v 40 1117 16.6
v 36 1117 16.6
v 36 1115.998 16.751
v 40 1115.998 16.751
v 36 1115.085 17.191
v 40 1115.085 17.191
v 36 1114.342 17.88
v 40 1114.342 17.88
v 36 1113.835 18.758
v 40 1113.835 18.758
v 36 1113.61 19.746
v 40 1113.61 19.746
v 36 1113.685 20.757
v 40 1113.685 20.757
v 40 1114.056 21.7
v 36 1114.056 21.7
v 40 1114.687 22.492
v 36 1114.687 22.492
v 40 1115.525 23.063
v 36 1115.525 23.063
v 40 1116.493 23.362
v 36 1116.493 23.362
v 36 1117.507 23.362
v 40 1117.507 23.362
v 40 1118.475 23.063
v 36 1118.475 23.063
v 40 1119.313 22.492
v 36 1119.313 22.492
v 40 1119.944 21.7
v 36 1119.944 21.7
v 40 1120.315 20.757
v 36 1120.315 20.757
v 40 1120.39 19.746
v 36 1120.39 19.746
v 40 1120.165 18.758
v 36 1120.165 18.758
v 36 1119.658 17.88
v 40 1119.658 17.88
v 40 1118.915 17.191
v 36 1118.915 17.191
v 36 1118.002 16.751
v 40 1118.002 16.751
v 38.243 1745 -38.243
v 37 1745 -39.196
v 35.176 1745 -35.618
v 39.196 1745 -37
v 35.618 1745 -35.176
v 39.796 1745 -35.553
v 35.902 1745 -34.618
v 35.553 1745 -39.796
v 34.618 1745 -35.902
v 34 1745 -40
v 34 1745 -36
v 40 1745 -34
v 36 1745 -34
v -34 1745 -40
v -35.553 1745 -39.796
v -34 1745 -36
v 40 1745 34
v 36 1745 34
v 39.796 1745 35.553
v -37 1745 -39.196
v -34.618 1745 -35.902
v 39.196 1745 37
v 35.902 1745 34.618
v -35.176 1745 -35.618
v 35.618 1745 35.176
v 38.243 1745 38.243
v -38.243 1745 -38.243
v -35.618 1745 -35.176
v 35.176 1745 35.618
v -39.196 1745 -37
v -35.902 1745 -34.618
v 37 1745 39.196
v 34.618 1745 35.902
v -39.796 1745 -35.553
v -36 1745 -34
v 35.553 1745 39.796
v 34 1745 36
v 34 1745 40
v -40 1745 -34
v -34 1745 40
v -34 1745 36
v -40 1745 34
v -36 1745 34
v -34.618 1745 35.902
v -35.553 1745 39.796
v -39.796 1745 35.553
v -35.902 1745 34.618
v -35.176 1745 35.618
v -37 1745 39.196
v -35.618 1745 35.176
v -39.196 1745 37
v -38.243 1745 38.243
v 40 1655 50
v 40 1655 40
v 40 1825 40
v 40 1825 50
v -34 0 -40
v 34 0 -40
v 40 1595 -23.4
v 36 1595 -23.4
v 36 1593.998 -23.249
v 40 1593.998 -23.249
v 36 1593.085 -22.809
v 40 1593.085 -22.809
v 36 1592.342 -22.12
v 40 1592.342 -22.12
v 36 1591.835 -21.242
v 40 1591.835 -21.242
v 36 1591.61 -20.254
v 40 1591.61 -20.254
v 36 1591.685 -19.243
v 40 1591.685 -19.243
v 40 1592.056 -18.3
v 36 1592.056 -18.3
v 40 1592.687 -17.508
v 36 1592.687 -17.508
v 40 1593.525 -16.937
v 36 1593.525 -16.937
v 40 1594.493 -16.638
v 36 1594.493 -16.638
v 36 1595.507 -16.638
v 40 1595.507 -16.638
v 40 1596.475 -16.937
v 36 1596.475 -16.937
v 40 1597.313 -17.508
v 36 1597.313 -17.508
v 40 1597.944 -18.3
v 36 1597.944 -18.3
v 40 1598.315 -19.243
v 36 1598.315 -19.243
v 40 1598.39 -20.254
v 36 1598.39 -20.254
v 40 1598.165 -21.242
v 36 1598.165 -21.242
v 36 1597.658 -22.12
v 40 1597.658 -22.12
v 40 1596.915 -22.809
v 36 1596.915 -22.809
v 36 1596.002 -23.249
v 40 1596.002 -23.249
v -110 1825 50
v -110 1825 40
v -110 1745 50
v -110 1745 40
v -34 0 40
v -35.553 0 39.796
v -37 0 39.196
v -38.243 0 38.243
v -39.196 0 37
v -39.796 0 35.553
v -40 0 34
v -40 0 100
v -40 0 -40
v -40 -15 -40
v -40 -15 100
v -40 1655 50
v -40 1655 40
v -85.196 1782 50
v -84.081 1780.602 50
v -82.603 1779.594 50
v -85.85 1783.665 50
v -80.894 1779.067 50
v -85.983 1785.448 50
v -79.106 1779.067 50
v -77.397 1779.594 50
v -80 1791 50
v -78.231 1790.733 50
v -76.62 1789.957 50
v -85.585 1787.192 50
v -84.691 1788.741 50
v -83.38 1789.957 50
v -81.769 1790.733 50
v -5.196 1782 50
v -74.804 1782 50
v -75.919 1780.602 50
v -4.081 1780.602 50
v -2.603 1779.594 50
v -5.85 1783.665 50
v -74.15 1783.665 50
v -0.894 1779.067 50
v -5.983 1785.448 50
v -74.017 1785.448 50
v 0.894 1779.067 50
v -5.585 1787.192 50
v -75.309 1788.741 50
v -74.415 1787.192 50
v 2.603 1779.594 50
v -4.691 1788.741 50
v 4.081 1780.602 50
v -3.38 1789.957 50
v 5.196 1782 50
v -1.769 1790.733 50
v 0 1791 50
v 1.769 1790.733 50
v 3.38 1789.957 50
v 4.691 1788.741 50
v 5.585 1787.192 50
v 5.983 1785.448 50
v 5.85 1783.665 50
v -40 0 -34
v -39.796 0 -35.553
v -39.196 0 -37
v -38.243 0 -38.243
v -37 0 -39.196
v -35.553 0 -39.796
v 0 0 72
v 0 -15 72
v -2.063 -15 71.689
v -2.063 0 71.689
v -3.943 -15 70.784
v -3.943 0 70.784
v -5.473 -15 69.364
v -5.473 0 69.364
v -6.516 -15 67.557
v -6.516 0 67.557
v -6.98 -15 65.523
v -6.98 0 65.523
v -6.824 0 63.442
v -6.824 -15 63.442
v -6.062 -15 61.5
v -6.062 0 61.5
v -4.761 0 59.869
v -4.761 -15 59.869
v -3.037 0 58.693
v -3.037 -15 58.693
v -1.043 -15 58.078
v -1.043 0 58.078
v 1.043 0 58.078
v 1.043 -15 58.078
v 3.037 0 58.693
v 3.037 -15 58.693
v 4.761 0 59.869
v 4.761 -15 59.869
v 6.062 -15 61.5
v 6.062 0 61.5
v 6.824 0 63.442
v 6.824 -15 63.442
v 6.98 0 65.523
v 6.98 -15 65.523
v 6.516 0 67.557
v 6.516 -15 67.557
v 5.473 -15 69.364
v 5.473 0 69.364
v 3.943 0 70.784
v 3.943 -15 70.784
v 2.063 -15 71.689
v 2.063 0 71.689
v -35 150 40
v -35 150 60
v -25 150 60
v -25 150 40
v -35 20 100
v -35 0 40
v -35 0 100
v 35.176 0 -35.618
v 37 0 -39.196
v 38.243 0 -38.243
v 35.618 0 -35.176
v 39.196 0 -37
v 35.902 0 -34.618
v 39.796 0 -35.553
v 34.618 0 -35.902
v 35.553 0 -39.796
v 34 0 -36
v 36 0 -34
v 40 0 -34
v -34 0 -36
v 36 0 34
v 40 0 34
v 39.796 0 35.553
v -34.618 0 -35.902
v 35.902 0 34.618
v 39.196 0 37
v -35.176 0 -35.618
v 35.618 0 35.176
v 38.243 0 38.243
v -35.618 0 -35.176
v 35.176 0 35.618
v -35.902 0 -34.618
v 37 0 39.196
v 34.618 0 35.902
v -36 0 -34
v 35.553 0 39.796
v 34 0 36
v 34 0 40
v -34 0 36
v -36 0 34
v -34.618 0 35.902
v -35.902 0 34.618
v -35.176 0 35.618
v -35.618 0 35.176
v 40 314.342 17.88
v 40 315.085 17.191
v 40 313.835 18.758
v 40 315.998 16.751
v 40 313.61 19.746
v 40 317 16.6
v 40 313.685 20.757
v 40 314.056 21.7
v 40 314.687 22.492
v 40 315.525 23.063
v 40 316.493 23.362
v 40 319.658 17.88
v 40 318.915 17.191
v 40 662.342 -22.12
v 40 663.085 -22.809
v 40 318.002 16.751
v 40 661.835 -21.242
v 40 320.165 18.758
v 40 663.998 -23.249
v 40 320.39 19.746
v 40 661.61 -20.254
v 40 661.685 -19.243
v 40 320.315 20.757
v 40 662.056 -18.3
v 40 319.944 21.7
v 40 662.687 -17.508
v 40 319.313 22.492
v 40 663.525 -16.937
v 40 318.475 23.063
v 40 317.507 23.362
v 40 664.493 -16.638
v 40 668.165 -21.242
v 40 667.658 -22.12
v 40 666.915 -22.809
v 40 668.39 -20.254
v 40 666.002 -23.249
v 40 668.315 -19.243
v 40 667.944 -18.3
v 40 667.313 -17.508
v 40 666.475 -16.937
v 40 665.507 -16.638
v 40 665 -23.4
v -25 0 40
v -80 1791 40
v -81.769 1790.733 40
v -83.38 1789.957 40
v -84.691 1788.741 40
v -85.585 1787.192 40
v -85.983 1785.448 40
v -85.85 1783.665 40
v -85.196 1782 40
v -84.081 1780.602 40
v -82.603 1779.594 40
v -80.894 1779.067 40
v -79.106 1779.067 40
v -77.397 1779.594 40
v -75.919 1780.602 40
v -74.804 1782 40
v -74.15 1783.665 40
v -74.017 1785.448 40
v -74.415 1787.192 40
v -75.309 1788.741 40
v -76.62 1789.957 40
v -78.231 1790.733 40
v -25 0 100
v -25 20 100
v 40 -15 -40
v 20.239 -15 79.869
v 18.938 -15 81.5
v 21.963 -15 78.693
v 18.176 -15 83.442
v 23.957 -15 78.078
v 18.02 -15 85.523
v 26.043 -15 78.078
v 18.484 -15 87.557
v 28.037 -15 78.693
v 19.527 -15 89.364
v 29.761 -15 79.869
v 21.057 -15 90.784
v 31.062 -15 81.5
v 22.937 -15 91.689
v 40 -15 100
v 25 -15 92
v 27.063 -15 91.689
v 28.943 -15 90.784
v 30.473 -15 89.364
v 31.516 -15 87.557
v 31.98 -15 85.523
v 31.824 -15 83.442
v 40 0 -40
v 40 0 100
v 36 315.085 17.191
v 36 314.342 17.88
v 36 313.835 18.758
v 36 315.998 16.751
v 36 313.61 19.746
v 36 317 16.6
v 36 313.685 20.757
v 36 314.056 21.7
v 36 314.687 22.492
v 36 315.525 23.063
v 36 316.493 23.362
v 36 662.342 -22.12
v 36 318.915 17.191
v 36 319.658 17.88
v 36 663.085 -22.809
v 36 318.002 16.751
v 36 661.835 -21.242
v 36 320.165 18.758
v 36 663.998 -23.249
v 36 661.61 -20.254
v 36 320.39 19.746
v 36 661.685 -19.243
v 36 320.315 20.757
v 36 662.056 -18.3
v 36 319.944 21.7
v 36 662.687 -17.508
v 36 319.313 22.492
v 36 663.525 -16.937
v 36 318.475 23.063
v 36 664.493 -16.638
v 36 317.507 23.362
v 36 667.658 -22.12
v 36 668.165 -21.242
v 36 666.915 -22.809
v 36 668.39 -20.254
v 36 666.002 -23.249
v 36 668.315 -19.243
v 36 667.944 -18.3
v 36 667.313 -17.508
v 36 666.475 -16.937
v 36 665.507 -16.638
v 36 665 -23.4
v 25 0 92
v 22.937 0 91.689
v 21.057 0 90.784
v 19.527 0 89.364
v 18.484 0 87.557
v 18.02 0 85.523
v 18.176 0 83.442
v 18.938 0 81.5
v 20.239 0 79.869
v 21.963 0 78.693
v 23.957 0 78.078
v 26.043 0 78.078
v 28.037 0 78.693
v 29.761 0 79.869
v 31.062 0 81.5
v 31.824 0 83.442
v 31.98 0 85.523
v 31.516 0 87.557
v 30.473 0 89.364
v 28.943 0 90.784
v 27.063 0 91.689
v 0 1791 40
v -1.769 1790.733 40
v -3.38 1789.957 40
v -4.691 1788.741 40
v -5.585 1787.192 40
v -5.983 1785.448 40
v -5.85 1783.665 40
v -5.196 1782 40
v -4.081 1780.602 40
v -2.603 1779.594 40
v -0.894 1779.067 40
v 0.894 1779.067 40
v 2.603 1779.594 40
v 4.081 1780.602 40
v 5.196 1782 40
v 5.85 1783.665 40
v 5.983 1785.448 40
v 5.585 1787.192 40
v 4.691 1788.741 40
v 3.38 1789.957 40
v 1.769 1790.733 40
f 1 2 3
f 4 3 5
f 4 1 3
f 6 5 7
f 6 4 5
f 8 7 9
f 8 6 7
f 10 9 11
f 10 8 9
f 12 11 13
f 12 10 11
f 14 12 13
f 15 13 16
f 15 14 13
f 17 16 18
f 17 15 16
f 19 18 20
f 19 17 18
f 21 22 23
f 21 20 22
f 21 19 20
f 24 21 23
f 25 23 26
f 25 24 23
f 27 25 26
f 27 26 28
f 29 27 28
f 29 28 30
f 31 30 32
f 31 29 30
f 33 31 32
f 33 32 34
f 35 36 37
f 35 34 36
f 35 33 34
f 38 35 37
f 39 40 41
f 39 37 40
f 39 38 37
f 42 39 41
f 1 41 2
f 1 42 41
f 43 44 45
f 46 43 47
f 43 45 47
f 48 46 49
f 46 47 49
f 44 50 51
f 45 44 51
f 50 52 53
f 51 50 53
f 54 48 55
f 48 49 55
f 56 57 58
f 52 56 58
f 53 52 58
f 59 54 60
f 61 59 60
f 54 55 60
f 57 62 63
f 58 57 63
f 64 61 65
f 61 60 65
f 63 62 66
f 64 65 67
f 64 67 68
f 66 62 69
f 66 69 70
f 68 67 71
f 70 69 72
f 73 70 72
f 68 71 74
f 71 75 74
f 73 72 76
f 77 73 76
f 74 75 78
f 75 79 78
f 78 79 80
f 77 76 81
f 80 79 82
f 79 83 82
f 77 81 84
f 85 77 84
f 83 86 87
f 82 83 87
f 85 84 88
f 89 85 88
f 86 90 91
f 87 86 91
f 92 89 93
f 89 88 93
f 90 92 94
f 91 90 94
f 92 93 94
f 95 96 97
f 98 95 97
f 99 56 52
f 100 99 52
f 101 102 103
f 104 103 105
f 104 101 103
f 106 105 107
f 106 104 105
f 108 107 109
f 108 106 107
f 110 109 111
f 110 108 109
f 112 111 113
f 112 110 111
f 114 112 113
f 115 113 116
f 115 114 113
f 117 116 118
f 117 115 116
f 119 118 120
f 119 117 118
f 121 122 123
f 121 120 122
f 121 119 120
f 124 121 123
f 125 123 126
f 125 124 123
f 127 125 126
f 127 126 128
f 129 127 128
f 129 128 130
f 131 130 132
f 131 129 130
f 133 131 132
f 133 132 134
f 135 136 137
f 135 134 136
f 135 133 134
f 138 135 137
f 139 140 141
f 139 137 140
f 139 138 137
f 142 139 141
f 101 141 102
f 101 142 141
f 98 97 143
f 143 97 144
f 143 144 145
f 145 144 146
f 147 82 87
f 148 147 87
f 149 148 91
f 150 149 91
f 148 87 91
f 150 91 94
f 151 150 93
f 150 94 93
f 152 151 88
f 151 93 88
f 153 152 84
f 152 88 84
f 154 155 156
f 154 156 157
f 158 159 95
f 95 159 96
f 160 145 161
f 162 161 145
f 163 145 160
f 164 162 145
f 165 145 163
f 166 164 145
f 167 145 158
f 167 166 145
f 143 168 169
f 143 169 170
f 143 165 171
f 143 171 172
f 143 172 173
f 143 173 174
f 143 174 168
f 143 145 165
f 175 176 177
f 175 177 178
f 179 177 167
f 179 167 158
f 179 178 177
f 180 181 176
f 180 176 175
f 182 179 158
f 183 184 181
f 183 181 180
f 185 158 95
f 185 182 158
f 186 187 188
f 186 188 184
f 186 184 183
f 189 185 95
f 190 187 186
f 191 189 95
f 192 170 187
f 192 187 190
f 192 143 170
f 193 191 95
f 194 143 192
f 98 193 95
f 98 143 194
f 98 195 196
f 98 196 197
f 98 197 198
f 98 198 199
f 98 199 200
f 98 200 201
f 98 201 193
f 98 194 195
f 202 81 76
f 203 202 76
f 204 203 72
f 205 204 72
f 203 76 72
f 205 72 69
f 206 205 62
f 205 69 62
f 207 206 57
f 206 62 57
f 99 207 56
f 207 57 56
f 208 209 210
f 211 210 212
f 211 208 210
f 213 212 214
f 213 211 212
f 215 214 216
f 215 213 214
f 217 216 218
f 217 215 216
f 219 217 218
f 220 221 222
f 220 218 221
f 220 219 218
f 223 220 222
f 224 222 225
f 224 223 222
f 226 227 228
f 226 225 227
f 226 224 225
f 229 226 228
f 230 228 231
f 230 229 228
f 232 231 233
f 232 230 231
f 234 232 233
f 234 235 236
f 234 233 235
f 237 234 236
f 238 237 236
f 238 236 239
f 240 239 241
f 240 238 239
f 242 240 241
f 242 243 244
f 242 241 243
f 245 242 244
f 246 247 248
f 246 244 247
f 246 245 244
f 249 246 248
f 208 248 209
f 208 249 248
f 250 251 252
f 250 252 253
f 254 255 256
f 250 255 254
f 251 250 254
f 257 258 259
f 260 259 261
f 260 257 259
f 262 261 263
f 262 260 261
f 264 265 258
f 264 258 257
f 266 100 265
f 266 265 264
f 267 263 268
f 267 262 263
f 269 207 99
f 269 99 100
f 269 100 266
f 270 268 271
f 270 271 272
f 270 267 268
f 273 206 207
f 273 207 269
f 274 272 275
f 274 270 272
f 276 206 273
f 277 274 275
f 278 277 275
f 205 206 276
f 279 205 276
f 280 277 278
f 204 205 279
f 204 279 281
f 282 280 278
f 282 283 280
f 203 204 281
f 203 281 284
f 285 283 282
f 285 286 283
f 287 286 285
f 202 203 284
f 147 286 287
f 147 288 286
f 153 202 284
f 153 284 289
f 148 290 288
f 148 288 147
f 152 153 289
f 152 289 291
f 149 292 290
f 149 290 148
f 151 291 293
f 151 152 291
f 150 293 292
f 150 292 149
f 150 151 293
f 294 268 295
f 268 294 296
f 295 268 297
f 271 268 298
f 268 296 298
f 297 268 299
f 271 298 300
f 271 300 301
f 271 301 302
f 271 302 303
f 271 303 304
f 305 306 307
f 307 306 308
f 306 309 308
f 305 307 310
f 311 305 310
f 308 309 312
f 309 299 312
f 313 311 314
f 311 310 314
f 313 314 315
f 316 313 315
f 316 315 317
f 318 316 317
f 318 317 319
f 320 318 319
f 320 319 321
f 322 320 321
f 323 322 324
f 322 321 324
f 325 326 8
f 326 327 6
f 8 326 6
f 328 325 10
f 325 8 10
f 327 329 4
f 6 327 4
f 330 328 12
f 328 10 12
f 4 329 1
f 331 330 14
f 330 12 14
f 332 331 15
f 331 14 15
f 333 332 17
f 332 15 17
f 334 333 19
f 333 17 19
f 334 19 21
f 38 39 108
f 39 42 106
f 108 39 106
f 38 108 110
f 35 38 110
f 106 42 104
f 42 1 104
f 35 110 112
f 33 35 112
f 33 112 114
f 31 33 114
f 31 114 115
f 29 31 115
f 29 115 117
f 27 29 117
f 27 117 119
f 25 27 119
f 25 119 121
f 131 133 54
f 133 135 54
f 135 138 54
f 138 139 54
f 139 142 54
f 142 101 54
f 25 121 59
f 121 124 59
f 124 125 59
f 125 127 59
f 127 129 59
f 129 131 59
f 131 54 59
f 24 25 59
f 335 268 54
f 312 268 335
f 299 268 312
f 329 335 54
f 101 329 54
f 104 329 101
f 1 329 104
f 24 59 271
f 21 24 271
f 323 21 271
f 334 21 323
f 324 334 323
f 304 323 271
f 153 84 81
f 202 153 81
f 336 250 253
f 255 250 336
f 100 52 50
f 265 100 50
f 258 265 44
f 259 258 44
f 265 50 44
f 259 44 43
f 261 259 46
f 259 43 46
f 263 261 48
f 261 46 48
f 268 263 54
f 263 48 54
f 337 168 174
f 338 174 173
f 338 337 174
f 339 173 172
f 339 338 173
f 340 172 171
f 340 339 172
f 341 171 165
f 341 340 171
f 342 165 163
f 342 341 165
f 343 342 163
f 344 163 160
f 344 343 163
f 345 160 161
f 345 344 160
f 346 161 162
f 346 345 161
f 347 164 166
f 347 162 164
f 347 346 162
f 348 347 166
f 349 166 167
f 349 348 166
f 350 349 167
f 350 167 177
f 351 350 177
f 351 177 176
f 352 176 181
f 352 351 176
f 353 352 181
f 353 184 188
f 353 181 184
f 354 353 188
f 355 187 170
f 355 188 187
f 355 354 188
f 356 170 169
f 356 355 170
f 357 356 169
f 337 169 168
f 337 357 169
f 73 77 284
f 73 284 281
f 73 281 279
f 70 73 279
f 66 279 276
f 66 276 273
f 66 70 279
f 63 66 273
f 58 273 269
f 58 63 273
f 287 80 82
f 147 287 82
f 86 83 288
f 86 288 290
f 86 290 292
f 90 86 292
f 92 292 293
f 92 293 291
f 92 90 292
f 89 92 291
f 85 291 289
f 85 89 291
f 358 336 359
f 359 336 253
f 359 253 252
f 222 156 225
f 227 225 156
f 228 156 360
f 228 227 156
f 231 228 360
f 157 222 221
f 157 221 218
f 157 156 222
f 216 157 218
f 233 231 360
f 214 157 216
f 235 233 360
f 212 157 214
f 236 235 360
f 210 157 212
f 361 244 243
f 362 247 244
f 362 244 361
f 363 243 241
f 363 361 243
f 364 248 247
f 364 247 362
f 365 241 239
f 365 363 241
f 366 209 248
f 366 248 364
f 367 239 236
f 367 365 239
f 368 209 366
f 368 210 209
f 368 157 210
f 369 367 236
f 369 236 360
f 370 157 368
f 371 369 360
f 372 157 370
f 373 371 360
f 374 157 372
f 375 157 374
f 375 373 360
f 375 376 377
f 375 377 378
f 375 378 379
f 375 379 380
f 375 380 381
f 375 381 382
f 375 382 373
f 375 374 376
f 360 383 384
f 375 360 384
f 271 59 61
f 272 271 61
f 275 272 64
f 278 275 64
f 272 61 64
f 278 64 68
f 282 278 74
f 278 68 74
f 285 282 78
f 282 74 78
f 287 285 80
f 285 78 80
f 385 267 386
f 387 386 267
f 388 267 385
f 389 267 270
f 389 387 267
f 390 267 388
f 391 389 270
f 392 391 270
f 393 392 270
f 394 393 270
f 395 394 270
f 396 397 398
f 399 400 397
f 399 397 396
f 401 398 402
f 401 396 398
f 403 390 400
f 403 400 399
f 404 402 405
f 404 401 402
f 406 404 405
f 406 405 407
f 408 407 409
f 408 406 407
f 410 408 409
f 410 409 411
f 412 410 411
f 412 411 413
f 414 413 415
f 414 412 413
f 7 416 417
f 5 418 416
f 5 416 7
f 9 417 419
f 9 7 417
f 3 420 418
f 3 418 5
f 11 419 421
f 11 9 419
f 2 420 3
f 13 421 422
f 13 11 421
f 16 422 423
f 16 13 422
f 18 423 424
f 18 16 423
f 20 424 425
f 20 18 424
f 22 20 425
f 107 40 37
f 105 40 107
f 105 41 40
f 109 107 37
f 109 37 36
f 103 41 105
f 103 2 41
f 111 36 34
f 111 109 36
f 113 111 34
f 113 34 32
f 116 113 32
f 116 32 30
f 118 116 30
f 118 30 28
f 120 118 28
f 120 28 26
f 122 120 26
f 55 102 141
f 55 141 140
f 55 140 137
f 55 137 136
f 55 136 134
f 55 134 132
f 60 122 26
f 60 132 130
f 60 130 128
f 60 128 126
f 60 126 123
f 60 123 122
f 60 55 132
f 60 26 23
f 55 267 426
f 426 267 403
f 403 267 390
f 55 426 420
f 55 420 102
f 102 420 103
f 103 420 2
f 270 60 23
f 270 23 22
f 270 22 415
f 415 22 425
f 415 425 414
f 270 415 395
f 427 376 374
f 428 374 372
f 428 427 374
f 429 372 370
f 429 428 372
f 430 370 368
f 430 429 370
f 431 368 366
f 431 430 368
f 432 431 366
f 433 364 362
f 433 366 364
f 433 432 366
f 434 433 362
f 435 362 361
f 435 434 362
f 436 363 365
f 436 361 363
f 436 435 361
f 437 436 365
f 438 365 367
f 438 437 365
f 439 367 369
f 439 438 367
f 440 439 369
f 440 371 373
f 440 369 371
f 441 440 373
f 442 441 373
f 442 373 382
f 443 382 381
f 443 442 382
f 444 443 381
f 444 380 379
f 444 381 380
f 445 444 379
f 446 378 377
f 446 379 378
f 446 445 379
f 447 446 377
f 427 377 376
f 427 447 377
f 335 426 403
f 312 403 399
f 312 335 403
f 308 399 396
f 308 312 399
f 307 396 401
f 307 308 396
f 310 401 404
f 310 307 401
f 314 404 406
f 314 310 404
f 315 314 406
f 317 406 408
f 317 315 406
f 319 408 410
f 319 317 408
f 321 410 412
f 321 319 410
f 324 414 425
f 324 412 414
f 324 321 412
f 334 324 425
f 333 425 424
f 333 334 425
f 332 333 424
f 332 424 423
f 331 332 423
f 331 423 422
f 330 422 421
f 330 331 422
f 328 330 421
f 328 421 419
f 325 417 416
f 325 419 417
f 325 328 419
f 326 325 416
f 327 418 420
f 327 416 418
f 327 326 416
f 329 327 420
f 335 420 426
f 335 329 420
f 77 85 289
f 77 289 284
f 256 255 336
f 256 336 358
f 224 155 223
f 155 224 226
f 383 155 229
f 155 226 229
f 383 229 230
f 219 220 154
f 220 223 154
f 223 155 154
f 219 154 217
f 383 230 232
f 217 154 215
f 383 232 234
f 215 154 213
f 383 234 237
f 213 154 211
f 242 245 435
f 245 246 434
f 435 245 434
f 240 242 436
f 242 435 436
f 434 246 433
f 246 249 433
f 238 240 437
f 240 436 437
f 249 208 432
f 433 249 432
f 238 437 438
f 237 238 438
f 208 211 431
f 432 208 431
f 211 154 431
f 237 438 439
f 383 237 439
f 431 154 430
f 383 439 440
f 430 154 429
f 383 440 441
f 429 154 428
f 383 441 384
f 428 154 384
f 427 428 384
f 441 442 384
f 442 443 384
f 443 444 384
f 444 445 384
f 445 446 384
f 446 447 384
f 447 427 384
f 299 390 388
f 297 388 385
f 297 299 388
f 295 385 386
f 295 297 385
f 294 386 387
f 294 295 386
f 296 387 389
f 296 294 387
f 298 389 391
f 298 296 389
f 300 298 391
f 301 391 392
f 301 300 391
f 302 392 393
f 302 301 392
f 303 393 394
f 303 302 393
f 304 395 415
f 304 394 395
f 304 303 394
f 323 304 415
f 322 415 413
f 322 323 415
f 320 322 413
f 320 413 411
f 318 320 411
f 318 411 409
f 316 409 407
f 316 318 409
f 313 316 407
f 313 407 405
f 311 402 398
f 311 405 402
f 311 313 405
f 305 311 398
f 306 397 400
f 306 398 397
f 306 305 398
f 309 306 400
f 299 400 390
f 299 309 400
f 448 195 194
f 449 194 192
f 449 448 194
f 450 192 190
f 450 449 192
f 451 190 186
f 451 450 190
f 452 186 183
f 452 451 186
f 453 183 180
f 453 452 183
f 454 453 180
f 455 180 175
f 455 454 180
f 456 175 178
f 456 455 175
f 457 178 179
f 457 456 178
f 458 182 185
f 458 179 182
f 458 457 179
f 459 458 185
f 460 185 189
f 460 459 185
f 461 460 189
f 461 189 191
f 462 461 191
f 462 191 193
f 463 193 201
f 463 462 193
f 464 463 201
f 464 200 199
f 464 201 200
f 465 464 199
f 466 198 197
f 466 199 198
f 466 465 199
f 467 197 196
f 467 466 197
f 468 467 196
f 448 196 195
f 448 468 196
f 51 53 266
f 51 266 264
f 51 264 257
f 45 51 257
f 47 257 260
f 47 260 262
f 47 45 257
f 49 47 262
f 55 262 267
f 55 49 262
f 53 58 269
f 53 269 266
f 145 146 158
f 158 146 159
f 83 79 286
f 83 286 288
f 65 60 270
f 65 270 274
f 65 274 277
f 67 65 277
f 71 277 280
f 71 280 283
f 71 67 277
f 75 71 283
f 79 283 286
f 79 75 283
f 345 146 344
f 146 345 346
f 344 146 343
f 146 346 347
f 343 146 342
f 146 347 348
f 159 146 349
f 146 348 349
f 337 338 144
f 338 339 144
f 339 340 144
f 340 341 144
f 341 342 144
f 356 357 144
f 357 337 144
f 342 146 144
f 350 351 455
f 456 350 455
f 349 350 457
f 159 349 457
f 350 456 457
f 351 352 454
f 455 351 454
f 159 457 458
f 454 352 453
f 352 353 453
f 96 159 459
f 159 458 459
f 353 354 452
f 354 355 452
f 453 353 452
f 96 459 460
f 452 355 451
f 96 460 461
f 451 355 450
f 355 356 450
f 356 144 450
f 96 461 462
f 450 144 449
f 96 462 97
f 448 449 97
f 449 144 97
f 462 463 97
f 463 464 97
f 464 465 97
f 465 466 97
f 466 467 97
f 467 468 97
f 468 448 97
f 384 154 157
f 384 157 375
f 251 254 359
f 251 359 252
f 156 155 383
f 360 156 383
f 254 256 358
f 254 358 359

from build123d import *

# Parameters (mm, degrees)
MEMBER_1_DEPTH                   = 1745
SKETCH_4_W                       = 80
SKETCH_4_H                       = 140
EXTRUDE_1_DEPTH                  = 15
HOLE_WIZARD_14_0_14_1_AT_2_COUNT = 2
HOLE_WIZARD_14_0_14_1_AT_2_PITCH = 32.015621187
EXTRUDE_START                    = -60
EXTRUDE_2_DEPTH                  = 10
EXTRUDE_3_DEPTH                  = 10
HOLE_WIZARD_M10_1_AT_2_COUNT     = 2
HOLE_WIZARD_M10_1_AT_2_PITCH     = 80
HOLE_WIZARD_M8_1_AT_2_COUNT      = 2
HOLE_WIZARD_M8_1_AT_2_PITCH      = 930
HOLE_WIZARD_M8_3_AT_2_COUNT      = 2
HOLE_WIZARD_M8_3_AT_2_PITCH      = 800


with BuildPart() as part:
    # Sketch11 → Member 1 (new body)
    with BuildSketch(Plane(origin=(0, 1745, 0), x_dir=(0, 0, 1), z_dir=(0, -1, 0))):
        with BuildLine():
            Line((-34, -40), (34, -40))
            ThreePointArc((34, -40), (38.242640687, -38.242640687), (40, -34))
            Line((40, -34), (40, 34))
            ThreePointArc((40, 34), (38.242640687, 38.242640687), (34, 40))
            Line((34, 40), (-34, 40))
            ThreePointArc((-34, 40), (-38.242640687, 38.242640687), (-40, 34))
            Line((-40, 34), (-40, -34))
            ThreePointArc((-40, -34), (-38.242640687, -38.242640687), (-34, -40))
        make_face()
        with BuildLine():
            Line((-34, -36), (34, -36))
            ThreePointArc((34, -36), (35.414213562, -35.414213562), (36, -34))
            Line((36, -34), (36, 34))
            ThreePointArc((36, 34), (35.414213562, 35.414213562), (34, 36))
            Line((34, 36), (-34, 36))
            ThreePointArc((-34, 36), (-35.414213562, 35.414213562), (-36, 34))
            Line((-36, 34), (-36, -34))
            ThreePointArc((-36, -34), (-35.414213562, -35.414213562), (-34, -36))
        make_face(mode=Mode.SUBTRACT)
    extrude(amount=MEMBER_1_DEPTH)

    # 草图32 → M8 螺纹孔1 (revolve, cut)
    with BuildSketch(Plane(origin=(40, 1595, -20), x_dir=(0, 0, -1), z_dir=(0, 1, 0))):
        Polygon((0, 0), (0, 21.792926105), (3.4, 19.75), (3.4, 0), align=None)
    hole_wizard_m8_1 = revolve(axis=Axis((46.35, 1595, -20), (-1, 0, 0)), mode=Mode.SUBTRACT)

    # M8 螺纹孔1 at 2: M8 螺纹孔1 ×2
    with Locations(*[(0, -i * HOLE_WIZARD_M8_1_AT_2_PITCH, 0) for i in range(1, HOLE_WIZARD_M8_1_AT_2_COUNT)]):
        add(hole_wizard_m8_1, mode=Mode.SUBTRACT)

    # 草图38 → M8 螺纹孔3 (revolve, cut)
    with BuildSketch(Plane(origin=(40, 1117, 20.000000004), x_dir=(0, 0, -1), z_dir=(0, 1, 0))):
        Polygon((0, 0), (0, 24.292926105), (3.4, 22.25), (3.4, 0), align=None)
    hole_wizard_m8_3 = revolve(axis=Axis((46.35, 1117, 20.000000004), (-1, 0, 0)), mode=Mode.SUBTRACT)

    # M8 螺纹孔3 at 2: M8 螺纹孔3 ×2
    with Locations(*[(0, -i * HOLE_WIZARD_M8_3_AT_2_PITCH, 0) for i in range(1, HOLE_WIZARD_M8_3_AT_2_COUNT)]):
        add(hole_wizard_m8_3, mode=Mode.SUBTRACT)


with BuildPart() as body_2:
    # 草图4 → 凸台-拉伸1 (new body)
    with BuildSketch(Plane.XZ):
        with Locations((0, 30)):
            Rectangle(SKETCH_4_W, SKETCH_4_H)
    extrude(amount=EXTRUDE_1_DEPTH)

    # 草图12 → Ø14.0 (14) 直径孔1 (revolve, cut)
    with BuildSketch(Plane(origin=(25, 0, 85), x_dir=(0, 0, 1), z_dir=(1, 0, 0))):
        Polygon((0, 0), (0, 44.206024333), (7, 40), (7, 0), align=None)
    hole_wizard_14_0_14_1 = revolve(axis=Axis((25, 6.35, 85), (0, -1, 0)), mode=Mode.SUBTRACT)

    # Ø14.0 (14) 直径孔1 at 2: Ø14.0 (14) 直径孔1 ×2
    with Locations(*[Vector(-0.7808688094430303, 0, -0.6246950475544244) * (i * HOLE_WIZARD_14_0_14_1_AT_2_PITCH) for i in range(1, HOLE_WIZARD_14_0_14_1_AT_2_COUNT)]):
        add(hole_wizard_14_0_14_1, mode=Mode.SUBTRACT)


with BuildPart() as body_3:
    # 草图11 → 凸台-拉伸2 (new body)
    with BuildSketch(Plane(origin=(25, 0, 0), x_dir=(0, 0, -1), z_dir=(1, 0, 0)).offset(EXTRUDE_START)):
        Polygon((-100, 20), (-60, 150), (-40, 150), (-40, 0), (-100, 0), align=None)
    extrude(amount=EXTRUDE_2_DEPTH)


with BuildPart() as body_4:
    # 草图20 → 凸台-拉伸3 (new body)
    with BuildSketch(Plane.XY.offset(40)):
        Polygon((40, 1655), (40, 1825), (-110, 1825), (-110, 1745), (-40, 1655), align=None)
    extrude(amount=EXTRUDE_3_DEPTH)

    # 草图30 → M10 间隙孔1 (revolve, cut)
    with BuildSketch(Plane(origin=(0, 1785, 40), x_dir=(0, 1, 0), z_dir=(1, 0, 0))):
        Polygon((0, 0), (0, 33.605163714), (6, 30), (6, 0), align=None)
    hole_wizard_m10_1 = revolve(axis=Axis((0, 1785, 33.65), (0, 0, 1)), mode=Mode.SUBTRACT)

    # M10 间隙孔1 at 2: M10 间隙孔1 ×2
    with Locations(*[(-i * HOLE_WIZARD_M10_1_AT_2_PITCH, 0, 0) for i in range(1, HOLE_WIZARD_M10_1_AT_2_COUNT)]):
        add(hole_wizard_m10_1, mode=Mode.SUBTRACT)


solid = Compound([part.part, body_2.part, body_3.part, body_4.part])
